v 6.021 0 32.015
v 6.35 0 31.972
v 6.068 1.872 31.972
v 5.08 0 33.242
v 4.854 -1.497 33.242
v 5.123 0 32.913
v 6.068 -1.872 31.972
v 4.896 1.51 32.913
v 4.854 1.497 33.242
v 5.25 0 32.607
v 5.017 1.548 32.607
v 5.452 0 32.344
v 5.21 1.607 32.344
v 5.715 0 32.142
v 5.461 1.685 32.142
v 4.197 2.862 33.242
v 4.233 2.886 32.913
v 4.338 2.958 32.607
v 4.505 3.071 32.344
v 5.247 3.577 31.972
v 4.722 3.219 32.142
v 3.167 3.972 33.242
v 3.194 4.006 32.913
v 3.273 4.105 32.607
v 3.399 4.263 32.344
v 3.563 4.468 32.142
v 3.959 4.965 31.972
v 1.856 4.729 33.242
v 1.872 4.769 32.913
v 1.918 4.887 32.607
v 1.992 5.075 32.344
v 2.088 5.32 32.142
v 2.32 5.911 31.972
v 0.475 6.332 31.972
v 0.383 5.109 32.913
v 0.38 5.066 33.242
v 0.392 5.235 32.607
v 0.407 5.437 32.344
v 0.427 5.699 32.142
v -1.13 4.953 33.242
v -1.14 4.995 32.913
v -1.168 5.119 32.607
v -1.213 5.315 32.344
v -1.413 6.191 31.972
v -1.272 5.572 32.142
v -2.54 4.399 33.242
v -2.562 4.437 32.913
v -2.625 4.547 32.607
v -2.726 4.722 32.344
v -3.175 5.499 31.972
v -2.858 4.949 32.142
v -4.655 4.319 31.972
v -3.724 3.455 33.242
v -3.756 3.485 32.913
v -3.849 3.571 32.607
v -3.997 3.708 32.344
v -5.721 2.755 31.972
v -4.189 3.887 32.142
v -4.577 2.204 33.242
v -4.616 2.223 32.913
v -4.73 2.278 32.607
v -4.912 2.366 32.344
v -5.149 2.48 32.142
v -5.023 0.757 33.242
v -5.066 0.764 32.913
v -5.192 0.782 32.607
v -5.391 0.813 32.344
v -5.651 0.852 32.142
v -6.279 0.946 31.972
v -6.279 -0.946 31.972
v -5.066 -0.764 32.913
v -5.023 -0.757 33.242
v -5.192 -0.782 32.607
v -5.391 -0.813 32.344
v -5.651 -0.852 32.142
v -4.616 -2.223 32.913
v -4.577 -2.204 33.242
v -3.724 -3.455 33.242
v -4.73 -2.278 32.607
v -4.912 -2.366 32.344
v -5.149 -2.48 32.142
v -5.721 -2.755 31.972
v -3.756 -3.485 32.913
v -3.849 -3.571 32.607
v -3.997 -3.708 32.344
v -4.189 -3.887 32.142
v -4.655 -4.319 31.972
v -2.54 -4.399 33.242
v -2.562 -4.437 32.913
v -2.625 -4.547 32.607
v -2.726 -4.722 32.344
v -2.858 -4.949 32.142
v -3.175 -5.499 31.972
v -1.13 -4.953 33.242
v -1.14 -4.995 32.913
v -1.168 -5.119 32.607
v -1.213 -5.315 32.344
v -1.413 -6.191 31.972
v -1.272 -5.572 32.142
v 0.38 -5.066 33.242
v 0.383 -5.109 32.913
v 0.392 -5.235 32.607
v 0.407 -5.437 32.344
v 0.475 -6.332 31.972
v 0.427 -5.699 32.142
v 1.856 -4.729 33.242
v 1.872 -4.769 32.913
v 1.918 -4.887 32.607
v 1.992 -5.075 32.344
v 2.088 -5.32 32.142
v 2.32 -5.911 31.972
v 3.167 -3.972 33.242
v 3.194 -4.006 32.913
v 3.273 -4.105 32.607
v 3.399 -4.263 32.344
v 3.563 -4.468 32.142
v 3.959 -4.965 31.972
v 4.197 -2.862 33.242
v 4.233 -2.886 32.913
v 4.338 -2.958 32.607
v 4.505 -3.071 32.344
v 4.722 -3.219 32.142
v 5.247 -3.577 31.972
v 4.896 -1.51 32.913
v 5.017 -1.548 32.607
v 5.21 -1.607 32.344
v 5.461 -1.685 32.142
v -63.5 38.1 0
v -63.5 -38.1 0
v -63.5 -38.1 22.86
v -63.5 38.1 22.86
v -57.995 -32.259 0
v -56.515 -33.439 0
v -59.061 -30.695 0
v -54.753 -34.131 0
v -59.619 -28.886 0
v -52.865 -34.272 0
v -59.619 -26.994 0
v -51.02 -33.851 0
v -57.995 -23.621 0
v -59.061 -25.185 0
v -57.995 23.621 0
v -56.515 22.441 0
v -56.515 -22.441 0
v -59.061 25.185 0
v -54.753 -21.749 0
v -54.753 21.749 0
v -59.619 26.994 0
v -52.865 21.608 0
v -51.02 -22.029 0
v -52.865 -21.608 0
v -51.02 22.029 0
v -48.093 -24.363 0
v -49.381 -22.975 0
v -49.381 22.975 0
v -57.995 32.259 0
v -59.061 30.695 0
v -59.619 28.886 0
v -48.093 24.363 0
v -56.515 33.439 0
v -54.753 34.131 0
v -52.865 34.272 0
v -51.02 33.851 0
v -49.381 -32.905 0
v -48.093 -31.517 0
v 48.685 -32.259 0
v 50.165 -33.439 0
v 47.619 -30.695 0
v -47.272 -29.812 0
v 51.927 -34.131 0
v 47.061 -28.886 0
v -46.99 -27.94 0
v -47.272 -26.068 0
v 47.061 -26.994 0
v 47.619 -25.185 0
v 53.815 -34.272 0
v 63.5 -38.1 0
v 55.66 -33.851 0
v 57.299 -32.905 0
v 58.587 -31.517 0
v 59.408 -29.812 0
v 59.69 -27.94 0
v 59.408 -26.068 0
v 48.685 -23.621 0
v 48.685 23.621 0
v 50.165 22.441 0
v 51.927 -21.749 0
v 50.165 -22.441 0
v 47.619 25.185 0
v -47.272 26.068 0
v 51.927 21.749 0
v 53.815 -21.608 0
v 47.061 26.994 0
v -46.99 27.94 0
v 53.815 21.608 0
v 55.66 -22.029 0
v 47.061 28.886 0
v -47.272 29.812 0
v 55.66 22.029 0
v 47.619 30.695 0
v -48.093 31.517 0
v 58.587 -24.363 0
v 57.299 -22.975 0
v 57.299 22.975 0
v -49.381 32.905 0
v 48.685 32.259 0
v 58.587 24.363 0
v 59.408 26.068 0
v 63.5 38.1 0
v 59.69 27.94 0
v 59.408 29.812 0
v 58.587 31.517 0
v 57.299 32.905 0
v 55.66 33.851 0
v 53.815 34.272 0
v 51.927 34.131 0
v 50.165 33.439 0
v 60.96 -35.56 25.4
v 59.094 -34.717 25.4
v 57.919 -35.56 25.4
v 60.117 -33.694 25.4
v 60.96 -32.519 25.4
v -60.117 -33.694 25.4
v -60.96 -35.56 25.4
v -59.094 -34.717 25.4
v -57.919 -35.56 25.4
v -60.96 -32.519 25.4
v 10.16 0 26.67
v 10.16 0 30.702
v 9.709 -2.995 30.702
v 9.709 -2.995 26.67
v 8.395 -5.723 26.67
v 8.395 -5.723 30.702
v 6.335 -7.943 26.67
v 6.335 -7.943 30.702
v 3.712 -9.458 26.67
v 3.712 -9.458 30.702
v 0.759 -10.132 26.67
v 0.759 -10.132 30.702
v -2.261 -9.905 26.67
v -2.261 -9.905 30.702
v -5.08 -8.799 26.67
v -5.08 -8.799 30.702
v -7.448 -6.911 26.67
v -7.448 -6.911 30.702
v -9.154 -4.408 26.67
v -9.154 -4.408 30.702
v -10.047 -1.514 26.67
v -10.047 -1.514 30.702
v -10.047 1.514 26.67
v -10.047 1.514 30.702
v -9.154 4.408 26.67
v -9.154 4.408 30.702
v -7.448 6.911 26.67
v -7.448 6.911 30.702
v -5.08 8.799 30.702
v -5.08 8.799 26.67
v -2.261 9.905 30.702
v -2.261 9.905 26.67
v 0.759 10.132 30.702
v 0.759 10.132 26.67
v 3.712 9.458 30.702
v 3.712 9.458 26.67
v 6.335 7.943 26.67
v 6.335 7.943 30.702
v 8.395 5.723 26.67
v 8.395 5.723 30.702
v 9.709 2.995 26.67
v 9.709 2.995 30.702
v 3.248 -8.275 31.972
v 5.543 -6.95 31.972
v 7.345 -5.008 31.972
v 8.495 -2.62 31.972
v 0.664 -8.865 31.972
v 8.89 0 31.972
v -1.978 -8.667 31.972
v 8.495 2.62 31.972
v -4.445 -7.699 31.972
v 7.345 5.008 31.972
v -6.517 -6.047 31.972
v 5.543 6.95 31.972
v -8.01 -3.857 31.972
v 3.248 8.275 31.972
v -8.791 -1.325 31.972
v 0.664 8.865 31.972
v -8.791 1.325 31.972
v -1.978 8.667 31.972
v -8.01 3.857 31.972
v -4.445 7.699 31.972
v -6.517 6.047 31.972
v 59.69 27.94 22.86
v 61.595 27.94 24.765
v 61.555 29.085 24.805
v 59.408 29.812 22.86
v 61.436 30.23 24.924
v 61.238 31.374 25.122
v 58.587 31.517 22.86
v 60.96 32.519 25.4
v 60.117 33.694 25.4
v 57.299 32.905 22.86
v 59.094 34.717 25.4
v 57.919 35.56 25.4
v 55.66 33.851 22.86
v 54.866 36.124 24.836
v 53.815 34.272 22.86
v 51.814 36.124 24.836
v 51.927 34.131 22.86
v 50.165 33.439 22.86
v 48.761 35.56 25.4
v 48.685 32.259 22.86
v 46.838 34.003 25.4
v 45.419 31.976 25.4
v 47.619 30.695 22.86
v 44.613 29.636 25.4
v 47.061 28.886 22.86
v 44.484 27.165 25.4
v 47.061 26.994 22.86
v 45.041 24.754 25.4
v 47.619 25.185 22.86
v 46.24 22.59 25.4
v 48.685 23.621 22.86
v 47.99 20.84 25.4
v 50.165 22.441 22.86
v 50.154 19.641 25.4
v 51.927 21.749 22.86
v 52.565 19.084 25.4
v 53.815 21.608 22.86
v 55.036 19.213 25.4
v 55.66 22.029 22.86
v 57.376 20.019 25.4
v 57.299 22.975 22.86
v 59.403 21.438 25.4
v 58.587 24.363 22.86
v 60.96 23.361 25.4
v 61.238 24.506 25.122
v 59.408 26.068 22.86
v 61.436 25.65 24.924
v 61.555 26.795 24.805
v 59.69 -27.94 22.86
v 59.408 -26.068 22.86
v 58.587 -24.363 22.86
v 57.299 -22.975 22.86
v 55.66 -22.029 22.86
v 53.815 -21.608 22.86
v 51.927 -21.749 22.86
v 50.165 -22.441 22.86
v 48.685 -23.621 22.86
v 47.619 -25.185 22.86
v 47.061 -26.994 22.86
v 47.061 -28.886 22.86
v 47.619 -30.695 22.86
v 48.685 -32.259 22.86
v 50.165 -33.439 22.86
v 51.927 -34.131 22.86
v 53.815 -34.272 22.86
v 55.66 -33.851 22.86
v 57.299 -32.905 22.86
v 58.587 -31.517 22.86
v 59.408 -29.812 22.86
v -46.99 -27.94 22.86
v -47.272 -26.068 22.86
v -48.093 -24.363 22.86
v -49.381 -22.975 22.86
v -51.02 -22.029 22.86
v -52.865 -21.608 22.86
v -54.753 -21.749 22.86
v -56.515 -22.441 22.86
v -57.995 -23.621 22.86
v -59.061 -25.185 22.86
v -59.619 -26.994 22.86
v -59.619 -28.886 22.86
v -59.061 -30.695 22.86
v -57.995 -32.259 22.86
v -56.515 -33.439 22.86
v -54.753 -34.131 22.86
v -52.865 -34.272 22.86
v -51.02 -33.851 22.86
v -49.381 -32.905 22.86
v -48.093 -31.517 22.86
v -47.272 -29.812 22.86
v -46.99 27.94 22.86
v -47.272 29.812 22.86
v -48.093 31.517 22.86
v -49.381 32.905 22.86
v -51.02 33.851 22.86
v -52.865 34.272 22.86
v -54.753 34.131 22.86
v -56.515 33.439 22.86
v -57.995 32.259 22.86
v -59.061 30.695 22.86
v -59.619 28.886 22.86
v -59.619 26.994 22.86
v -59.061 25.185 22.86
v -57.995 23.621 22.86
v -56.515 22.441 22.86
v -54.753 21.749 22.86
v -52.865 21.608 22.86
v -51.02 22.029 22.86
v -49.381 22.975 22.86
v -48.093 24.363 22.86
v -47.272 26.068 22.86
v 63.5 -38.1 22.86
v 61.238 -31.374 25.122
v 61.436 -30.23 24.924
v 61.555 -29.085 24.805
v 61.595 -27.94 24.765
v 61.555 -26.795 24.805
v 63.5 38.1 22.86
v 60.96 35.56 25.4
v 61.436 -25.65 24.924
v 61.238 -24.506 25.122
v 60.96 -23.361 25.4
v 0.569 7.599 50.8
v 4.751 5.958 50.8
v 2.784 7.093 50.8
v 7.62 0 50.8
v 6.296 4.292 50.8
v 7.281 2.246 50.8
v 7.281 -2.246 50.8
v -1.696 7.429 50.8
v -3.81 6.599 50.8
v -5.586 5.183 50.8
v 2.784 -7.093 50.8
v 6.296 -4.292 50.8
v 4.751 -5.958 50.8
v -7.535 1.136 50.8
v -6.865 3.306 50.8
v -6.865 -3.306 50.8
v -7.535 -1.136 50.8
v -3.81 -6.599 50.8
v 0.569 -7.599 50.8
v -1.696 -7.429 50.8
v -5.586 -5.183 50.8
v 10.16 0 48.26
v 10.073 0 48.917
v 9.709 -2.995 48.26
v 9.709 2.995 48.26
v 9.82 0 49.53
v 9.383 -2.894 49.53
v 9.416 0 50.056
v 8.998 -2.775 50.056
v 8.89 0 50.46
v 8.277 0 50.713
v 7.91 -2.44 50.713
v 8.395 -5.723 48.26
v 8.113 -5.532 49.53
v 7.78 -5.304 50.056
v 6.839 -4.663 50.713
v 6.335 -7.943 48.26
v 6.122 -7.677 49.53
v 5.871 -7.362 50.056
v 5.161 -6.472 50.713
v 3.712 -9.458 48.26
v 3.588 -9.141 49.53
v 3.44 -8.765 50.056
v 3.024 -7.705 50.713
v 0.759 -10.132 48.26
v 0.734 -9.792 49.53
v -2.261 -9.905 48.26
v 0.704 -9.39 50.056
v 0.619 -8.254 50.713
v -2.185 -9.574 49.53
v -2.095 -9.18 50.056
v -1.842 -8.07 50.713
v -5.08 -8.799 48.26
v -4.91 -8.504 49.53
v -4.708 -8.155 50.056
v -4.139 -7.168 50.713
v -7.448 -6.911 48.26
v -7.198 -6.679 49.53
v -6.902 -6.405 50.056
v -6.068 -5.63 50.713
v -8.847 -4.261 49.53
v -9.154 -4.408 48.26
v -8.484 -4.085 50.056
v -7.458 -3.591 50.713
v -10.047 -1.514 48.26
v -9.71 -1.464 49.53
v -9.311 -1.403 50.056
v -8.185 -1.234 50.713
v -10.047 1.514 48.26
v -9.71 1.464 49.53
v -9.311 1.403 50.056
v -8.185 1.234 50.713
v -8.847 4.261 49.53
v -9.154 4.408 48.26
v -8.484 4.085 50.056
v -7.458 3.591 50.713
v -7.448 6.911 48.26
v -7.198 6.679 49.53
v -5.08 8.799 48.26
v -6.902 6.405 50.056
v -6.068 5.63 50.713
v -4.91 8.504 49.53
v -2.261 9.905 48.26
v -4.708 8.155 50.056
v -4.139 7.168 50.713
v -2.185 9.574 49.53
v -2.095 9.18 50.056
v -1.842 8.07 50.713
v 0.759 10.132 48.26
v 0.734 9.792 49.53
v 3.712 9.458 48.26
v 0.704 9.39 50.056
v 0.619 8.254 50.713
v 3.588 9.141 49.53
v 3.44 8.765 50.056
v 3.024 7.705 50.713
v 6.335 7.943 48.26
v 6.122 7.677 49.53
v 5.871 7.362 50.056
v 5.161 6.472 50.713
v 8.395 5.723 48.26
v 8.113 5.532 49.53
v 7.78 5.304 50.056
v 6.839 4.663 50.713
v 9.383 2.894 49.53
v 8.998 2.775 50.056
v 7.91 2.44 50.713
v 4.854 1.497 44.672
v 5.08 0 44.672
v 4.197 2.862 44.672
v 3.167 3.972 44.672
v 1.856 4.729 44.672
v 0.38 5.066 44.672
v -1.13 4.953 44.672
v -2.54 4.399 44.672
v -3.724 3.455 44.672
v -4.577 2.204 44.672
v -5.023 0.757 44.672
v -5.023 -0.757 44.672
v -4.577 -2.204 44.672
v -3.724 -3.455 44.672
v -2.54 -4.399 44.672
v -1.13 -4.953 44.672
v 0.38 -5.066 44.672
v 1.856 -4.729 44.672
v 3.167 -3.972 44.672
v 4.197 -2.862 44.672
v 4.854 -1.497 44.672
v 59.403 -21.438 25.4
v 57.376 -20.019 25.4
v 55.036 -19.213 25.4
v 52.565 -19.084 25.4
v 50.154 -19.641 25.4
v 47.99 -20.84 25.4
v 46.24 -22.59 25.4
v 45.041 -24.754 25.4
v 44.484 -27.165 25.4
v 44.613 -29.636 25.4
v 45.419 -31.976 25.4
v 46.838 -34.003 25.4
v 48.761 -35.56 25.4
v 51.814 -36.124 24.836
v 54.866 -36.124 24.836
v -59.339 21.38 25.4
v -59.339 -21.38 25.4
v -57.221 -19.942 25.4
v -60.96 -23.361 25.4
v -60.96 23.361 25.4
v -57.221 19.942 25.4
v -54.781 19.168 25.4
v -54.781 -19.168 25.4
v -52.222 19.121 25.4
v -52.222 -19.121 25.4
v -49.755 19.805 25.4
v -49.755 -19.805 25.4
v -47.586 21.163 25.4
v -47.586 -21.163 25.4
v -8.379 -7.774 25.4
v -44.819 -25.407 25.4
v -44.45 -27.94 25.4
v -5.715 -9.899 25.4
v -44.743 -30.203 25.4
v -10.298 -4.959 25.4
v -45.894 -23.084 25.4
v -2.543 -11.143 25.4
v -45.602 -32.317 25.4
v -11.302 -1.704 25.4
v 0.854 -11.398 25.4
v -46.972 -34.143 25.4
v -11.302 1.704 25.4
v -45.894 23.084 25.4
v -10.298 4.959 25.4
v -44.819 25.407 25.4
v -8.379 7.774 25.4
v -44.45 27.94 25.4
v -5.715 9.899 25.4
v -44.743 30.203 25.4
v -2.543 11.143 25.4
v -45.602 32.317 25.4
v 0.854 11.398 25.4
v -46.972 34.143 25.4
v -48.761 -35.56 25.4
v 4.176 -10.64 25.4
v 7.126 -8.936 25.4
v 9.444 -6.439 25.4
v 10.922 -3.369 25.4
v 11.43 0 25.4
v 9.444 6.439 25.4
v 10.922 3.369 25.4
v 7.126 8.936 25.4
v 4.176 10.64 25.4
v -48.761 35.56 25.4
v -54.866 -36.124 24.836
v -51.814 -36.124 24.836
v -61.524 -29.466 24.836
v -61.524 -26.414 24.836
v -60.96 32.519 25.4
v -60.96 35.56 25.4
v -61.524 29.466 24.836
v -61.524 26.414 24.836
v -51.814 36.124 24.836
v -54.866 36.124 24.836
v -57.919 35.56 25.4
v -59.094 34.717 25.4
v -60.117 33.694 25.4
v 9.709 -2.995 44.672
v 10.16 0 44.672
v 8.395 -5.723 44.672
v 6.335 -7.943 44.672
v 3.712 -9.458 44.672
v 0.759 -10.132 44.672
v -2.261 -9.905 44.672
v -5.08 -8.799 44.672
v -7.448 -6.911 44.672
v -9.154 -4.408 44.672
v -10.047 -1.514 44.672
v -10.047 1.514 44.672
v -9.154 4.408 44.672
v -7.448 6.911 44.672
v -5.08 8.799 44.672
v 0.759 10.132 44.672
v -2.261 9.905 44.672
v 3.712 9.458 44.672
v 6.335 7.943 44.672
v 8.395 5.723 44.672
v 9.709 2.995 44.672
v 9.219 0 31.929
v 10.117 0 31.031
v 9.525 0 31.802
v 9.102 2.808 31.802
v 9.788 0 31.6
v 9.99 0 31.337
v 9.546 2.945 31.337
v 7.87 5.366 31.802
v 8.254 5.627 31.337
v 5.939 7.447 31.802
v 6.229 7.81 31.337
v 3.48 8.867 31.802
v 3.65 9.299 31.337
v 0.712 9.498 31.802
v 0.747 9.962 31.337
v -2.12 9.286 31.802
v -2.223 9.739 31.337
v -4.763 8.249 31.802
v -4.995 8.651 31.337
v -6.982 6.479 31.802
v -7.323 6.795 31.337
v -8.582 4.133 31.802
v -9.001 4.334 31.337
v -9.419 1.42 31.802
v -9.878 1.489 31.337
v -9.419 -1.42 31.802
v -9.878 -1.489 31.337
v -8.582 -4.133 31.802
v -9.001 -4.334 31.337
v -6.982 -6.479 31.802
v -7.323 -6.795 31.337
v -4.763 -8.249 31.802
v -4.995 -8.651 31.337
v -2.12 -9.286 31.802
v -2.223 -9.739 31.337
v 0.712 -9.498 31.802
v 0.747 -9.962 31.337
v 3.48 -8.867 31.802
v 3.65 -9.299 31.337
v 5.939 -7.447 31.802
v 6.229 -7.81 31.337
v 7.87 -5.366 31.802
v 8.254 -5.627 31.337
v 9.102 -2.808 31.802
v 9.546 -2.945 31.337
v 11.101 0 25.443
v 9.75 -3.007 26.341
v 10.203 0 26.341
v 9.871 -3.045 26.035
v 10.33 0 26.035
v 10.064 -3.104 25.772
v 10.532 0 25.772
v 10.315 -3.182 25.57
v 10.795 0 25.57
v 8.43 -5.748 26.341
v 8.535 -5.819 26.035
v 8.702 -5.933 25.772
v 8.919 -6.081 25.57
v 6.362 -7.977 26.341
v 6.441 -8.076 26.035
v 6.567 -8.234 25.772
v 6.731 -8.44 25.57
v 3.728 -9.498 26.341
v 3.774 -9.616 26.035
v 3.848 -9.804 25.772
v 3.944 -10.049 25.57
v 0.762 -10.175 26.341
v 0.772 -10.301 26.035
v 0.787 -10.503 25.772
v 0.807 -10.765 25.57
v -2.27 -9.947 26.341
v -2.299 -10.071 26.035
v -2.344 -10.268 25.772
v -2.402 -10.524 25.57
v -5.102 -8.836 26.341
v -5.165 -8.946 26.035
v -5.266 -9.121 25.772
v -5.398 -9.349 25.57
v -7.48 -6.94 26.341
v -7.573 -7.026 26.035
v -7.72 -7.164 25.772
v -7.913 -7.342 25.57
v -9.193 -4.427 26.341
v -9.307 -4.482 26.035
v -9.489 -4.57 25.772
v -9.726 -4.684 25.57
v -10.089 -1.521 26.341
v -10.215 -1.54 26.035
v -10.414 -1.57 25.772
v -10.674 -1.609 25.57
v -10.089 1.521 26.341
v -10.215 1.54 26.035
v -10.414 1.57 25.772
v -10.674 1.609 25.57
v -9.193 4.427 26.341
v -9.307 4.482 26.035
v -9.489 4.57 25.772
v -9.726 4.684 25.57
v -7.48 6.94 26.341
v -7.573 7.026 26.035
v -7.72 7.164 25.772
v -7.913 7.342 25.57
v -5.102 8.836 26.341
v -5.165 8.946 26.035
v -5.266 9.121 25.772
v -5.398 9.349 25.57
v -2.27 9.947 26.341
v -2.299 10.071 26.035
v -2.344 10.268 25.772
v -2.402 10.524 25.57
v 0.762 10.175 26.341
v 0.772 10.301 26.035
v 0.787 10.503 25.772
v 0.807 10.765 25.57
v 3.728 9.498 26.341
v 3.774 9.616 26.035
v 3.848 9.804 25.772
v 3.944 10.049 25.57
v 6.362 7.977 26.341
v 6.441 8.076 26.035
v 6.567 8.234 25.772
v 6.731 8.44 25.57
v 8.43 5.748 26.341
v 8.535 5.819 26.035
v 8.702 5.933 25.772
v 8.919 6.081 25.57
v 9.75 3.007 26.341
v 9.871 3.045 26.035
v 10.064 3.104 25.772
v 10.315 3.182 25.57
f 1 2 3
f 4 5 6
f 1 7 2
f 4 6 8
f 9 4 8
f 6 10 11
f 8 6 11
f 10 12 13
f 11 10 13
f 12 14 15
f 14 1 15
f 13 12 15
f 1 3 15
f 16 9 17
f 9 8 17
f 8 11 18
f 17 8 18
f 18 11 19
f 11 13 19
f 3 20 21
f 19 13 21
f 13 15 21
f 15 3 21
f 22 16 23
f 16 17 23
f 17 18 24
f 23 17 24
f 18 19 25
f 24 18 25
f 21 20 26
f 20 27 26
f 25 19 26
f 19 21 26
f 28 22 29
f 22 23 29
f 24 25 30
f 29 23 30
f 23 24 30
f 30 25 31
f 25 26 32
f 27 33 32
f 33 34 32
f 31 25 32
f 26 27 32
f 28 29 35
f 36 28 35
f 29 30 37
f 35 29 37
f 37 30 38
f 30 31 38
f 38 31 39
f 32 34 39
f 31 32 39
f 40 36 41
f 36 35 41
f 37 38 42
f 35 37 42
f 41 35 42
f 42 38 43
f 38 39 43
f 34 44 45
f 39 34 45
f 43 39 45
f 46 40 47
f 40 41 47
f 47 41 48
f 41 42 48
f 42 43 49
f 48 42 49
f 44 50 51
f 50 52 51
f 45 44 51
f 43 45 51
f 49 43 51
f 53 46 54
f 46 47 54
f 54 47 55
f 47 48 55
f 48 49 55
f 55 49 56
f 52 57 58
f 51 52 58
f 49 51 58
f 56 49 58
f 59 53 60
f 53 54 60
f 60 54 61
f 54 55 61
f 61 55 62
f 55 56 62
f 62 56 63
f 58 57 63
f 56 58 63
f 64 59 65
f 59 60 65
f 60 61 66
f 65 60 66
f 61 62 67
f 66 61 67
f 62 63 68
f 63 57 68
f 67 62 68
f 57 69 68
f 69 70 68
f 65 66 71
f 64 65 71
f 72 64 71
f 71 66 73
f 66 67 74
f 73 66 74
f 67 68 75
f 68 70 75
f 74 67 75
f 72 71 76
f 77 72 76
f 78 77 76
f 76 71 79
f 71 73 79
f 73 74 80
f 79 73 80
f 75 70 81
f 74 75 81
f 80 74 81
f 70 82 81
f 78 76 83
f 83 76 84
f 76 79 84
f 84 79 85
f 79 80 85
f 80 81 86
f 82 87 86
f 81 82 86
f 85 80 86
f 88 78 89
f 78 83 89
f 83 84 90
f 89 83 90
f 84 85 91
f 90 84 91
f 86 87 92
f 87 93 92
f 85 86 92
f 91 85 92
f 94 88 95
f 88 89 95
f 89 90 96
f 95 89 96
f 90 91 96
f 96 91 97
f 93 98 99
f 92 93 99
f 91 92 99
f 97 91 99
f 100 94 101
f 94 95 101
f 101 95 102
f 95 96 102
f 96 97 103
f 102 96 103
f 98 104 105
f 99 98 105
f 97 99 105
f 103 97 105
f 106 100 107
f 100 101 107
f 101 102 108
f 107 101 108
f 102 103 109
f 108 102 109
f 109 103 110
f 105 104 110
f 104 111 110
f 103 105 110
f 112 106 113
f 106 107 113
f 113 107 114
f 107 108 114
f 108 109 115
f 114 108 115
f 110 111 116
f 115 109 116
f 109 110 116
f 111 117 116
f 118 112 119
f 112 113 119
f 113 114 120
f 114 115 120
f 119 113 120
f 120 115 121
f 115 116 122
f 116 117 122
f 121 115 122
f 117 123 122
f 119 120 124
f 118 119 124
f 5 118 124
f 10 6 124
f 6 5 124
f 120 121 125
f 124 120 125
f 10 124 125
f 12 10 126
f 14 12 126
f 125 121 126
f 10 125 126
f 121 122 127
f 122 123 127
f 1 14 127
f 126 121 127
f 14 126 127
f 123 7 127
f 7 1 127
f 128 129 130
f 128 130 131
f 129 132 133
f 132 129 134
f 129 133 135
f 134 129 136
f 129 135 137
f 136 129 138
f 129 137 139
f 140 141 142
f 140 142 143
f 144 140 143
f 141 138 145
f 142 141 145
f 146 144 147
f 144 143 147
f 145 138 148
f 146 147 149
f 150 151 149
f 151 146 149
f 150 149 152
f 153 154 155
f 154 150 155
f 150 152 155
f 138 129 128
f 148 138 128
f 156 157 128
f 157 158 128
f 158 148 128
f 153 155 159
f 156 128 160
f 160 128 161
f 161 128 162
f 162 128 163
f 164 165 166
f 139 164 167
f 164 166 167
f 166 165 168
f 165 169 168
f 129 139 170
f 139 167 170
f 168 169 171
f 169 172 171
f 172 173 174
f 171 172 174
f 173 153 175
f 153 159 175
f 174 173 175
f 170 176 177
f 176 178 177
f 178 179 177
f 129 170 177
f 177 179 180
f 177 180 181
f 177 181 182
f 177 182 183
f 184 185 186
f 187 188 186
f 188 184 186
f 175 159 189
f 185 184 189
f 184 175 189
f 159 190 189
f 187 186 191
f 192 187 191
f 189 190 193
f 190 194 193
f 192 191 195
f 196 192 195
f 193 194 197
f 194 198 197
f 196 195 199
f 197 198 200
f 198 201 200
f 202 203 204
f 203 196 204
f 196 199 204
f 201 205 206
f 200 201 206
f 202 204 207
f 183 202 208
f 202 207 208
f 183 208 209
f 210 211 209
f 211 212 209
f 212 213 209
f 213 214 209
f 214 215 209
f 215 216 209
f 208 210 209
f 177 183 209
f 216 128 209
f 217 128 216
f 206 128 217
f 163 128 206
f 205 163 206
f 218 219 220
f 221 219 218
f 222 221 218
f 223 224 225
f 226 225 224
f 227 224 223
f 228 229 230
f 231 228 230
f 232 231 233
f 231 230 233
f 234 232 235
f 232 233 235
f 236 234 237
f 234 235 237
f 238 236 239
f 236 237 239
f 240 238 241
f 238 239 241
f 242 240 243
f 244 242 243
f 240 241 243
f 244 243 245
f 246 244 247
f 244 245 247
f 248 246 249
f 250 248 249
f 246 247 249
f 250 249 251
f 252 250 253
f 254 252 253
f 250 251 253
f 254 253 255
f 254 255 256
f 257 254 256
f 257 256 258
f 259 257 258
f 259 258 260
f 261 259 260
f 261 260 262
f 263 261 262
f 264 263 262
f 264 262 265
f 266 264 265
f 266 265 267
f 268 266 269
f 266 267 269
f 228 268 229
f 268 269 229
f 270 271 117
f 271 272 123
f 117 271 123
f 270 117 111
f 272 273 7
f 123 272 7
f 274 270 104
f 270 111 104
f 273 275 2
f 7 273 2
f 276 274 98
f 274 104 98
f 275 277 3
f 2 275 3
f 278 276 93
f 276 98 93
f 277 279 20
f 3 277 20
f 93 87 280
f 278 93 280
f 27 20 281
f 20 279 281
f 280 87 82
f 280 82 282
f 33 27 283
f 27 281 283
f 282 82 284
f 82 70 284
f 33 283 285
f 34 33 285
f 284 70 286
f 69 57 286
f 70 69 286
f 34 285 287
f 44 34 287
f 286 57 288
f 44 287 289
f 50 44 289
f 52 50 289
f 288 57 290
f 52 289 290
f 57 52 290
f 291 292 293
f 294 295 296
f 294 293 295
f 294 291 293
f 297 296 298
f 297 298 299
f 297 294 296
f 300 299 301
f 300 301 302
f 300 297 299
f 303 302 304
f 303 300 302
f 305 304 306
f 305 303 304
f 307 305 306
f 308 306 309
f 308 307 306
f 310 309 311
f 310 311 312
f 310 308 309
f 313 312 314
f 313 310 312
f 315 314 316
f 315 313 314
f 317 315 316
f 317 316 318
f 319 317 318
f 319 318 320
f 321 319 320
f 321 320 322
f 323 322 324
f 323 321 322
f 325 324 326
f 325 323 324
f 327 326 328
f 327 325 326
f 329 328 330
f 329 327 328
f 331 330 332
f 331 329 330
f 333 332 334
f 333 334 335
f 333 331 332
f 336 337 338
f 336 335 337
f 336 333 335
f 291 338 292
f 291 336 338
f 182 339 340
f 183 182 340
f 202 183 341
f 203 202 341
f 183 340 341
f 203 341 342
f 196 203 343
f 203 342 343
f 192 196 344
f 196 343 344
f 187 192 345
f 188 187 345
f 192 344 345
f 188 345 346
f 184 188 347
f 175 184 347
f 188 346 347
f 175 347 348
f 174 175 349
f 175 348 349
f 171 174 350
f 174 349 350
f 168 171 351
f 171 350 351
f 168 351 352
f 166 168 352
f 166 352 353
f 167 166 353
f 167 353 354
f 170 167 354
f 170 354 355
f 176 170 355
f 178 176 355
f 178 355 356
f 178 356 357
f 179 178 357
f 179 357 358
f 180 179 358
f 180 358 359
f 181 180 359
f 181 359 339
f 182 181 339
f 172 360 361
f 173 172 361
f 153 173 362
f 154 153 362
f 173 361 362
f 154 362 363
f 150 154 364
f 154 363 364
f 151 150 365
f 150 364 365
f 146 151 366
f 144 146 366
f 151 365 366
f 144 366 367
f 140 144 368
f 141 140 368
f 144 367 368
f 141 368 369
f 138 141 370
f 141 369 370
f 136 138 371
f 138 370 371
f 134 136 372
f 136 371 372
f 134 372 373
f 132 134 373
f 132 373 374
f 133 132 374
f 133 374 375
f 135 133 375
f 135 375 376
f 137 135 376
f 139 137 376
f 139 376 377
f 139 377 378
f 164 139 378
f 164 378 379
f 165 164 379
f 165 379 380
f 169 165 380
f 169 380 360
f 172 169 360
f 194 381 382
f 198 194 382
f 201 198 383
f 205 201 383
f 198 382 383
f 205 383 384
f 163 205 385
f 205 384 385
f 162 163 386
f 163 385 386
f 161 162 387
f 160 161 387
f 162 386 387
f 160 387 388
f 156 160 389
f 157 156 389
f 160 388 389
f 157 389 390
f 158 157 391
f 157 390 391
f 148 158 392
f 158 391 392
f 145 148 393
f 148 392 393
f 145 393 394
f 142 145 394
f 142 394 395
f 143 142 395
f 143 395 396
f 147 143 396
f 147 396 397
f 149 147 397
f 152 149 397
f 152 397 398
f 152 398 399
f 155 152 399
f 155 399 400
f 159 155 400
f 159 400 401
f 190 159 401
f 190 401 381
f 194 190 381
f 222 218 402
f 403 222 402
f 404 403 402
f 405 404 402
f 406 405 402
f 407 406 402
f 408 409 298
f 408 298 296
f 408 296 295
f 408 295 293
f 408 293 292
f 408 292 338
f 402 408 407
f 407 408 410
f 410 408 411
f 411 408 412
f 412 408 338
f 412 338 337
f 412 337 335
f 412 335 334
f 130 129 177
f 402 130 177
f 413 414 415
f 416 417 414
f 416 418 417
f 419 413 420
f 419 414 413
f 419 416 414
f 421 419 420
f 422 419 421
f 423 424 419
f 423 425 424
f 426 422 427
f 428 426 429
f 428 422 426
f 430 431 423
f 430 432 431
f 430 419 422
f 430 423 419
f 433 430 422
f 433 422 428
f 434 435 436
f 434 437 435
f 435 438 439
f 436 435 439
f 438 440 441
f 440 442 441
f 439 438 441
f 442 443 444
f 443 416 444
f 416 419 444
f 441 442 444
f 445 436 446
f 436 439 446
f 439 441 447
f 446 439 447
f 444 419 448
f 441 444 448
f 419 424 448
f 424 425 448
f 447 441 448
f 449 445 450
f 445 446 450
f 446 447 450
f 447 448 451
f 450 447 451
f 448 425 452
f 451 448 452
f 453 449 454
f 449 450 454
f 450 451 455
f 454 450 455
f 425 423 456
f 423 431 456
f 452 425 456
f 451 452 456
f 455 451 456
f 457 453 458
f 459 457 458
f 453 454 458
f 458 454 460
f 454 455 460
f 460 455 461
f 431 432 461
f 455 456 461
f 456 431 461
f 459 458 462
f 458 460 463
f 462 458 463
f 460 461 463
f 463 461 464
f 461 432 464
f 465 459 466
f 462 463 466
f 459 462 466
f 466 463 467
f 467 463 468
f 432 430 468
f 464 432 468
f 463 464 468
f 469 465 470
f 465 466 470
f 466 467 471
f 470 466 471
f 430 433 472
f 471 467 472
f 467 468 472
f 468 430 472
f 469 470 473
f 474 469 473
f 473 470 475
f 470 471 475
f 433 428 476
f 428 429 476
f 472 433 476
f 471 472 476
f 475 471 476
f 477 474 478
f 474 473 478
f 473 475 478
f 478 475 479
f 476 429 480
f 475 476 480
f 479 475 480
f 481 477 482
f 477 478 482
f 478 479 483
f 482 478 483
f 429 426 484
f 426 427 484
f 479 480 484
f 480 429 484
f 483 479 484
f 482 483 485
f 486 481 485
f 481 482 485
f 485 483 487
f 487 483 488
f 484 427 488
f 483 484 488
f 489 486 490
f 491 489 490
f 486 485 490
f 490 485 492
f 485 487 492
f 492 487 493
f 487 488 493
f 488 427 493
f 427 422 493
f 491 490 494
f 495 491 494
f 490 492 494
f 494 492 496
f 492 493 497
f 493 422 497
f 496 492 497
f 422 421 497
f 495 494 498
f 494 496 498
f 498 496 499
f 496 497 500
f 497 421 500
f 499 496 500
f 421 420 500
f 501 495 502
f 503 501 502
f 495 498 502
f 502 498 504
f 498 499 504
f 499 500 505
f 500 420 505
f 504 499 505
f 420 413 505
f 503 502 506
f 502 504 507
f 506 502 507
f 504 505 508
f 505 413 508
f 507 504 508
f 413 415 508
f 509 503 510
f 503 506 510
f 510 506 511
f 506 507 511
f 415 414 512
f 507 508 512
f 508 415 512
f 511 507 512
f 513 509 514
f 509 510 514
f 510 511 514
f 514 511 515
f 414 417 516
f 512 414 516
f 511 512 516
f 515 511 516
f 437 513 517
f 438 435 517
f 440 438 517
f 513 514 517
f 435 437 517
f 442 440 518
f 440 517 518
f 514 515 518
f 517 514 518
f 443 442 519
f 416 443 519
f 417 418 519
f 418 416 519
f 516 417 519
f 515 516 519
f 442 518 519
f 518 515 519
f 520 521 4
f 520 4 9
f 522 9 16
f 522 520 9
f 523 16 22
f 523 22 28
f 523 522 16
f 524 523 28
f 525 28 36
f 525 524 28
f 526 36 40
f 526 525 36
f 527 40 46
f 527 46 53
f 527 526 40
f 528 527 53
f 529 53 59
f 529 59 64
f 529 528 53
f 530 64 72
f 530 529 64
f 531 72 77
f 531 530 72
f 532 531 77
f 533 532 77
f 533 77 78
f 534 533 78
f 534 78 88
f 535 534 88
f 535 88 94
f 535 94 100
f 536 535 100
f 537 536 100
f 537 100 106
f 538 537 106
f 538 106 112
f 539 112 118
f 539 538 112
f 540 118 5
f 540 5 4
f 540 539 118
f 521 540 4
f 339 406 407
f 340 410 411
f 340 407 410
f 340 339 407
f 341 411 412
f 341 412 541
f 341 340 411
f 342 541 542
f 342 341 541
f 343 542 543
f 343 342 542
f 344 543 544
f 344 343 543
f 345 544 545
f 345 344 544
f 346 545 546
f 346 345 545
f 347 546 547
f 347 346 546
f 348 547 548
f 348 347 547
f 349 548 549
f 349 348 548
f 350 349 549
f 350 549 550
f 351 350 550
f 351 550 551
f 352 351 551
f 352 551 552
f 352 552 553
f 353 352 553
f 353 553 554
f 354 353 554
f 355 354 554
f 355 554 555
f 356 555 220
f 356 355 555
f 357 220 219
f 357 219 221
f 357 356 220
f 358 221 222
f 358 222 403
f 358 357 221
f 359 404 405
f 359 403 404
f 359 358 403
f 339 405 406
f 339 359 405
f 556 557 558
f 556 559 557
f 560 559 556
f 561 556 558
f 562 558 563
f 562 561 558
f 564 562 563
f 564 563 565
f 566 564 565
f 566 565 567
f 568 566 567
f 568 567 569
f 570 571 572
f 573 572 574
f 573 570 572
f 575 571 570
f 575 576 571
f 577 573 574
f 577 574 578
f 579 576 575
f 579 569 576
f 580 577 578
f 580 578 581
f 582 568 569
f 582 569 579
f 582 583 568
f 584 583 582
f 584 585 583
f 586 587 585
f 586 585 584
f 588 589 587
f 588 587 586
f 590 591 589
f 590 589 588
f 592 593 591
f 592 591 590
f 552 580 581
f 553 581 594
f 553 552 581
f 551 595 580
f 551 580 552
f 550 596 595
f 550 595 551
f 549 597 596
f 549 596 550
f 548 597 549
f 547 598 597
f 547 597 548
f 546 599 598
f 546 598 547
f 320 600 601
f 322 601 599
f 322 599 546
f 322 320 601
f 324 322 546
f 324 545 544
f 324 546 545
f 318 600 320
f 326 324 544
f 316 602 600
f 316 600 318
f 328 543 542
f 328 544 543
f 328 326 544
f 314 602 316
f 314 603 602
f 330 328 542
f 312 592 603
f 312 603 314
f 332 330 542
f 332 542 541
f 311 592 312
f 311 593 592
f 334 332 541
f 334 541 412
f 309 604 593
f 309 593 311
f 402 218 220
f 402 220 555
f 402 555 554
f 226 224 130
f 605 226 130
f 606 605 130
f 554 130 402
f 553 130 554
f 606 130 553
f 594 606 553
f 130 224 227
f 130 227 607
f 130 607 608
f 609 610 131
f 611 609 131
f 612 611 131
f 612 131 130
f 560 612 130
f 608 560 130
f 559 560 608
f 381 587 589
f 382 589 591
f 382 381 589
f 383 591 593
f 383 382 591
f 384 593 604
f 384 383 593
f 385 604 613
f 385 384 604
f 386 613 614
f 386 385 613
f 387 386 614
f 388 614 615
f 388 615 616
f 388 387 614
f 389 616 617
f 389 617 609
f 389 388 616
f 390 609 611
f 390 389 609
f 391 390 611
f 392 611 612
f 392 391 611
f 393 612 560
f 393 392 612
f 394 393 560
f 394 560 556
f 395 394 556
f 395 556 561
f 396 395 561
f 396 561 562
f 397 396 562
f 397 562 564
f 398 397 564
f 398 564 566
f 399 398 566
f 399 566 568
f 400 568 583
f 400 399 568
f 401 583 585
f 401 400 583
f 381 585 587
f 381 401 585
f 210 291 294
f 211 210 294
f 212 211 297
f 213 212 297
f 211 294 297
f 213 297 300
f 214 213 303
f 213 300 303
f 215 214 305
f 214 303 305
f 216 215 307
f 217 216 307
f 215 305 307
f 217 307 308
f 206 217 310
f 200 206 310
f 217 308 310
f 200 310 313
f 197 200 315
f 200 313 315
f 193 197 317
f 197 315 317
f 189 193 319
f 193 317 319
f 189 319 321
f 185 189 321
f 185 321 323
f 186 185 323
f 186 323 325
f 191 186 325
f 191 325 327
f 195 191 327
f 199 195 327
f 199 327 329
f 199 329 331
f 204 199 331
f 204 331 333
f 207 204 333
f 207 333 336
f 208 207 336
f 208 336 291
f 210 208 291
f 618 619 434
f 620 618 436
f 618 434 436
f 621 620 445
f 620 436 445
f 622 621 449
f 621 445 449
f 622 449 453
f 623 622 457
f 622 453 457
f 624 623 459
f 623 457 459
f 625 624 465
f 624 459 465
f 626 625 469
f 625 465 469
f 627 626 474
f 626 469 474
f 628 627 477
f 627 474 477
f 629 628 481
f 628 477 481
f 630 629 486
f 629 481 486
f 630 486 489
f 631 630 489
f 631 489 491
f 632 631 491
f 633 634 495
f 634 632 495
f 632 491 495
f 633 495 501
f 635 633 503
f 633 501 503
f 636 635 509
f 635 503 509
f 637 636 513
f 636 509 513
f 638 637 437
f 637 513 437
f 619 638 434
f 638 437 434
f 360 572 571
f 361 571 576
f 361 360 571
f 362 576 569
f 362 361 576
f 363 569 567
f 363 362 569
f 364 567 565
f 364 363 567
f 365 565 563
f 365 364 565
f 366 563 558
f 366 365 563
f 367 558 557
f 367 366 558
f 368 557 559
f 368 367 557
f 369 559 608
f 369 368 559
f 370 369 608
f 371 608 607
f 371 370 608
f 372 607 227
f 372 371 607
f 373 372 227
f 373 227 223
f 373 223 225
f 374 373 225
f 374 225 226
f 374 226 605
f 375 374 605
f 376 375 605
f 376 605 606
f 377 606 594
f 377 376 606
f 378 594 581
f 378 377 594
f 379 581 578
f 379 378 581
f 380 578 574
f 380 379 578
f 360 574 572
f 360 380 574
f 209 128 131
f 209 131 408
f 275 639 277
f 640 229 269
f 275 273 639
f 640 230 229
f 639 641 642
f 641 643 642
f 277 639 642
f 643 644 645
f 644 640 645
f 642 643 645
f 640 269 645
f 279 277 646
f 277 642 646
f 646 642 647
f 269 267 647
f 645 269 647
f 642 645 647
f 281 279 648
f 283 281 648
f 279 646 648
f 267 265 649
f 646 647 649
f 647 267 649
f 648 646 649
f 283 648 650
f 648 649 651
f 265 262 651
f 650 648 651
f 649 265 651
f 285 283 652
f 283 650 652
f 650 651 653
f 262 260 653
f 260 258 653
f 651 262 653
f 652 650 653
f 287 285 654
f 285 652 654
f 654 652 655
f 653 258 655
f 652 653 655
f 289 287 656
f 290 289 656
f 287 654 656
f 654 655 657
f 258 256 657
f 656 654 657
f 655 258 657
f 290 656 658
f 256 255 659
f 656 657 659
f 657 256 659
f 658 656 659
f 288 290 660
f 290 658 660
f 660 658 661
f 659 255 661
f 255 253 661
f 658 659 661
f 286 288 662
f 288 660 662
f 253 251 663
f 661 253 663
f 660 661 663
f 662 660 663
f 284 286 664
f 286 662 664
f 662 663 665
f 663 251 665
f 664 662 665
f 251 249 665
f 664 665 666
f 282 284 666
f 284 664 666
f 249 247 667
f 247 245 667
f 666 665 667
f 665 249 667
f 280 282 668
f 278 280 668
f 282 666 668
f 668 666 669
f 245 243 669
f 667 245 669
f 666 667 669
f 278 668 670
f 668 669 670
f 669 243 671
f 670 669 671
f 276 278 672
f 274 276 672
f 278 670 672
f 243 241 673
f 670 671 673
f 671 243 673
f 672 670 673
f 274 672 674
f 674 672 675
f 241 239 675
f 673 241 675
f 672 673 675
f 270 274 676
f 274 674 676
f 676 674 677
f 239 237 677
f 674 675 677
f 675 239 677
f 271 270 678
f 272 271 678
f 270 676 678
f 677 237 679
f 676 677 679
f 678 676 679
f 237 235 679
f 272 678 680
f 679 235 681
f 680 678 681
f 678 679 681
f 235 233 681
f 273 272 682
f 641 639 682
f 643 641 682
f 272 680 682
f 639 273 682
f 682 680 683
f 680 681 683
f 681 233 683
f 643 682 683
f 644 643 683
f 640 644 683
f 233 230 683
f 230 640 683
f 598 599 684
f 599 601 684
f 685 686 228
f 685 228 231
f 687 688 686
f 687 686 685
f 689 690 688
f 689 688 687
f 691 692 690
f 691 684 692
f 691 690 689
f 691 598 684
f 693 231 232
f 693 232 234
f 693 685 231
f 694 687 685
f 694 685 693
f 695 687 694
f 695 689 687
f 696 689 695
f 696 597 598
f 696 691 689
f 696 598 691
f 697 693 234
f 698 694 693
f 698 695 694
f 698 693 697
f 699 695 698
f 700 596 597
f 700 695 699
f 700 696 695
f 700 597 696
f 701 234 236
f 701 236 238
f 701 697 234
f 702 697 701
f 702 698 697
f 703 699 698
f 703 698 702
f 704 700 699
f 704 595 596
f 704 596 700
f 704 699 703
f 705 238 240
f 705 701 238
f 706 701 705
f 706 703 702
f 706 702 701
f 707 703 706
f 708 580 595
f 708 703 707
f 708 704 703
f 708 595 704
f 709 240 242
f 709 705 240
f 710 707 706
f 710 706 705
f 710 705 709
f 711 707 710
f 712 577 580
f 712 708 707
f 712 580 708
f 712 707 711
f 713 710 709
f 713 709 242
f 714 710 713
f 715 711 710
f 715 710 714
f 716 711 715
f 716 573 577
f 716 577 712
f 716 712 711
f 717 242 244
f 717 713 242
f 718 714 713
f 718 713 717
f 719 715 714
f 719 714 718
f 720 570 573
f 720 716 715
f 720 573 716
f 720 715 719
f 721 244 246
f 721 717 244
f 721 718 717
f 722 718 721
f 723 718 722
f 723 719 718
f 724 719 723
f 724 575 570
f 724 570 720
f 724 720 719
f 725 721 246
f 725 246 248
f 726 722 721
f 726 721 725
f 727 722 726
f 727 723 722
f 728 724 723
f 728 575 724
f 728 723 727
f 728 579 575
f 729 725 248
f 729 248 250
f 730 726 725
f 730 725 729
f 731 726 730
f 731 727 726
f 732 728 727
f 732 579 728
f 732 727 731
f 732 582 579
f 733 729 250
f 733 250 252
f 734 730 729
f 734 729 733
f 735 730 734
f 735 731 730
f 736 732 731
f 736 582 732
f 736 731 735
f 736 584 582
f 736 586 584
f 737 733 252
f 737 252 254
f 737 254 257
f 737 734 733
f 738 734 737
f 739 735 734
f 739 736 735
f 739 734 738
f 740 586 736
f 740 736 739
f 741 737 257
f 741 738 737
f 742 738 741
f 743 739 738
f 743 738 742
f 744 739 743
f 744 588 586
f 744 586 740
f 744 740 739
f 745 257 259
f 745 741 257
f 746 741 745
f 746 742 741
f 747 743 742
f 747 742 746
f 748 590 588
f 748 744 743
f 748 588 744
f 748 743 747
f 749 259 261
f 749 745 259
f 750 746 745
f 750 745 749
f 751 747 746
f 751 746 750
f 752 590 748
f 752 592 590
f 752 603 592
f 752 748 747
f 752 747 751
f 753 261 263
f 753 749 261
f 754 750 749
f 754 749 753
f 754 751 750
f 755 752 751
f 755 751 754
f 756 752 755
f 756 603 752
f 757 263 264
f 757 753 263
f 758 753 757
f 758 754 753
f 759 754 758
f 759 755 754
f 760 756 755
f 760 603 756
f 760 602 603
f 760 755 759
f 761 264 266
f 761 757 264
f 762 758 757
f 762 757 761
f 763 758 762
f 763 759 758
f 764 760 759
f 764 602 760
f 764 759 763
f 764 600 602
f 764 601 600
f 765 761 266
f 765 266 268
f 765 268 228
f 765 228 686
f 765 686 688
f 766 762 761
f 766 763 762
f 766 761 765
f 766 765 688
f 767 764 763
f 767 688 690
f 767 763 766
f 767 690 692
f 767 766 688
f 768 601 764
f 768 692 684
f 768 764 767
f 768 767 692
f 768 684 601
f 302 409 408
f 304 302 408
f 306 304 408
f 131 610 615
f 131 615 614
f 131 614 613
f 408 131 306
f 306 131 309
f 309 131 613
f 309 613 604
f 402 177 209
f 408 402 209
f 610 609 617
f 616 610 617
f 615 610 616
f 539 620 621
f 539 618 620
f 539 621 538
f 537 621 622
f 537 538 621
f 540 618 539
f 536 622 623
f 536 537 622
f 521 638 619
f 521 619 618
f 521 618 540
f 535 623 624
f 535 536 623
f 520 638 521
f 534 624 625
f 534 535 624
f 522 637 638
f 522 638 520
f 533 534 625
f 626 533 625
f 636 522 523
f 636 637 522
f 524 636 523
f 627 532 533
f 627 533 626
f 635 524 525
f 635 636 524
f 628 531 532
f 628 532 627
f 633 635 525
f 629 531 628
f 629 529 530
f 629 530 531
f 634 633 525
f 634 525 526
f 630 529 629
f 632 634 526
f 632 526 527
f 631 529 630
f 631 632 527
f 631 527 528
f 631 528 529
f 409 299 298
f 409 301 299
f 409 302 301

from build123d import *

# Parameters (mm, degrees)
F0_W         = 127
F0_H         = 76.2
F1_DEPTH     = 25.4
F2_R         = 6.35
F3_DEPTH     = 25.401
F4_W         = 10.16
F4_H         = 25.4
F6_W         = 15.24
F6_H         = 12.7
F8_R         = 2.54
F9_R         = 1.27
F10_T1_DEPTH = 140.0641495789
F10_T3_DEPTH = 89.2641495789


# Not quite as in the source:
# - a fillet or chamfer that OpenCascade refuses, or shapes differently, is made with other operations: its cross-section is extruded or revolved along the edge and cut away or added


with BuildPart() as f1:
    # F0 (on Top) → F1 (new body)
    with BuildSketch(Plane.XY):
        Rectangle(F0_W, F0_H)
    extrude(amount=F1_DEPTH)

    # F2 (on face) → F3 (cut, through all)
    with BuildSketch(Plane.XY.offset(25.4)):
        with Locations((53.34, 27.94)):
            Circle(F2_R)
        with Locations((53.34, -27.94)):
            Circle(F2_R)
        with Locations((-53.34, 27.94)):
            Circle(F2_R)
        with Locations((-53.34, -27.94)):
            Circle(F2_R)
    extrude(amount=-F3_DEPTH, mode=Mode.SUBTRACT)

    # F4 (on Front) → F5 (revolve)
    with BuildSketch(Plane.XZ):
        with Locations((5.08, 38.1)):
            Rectangle(F4_W, F4_H)
    revolve(axis=Axis((0, 0, 38.1), (0, 0, -1)))

    # F6 (on Front) → F7 (revolve, cut)
    with BuildSketch(Plane.XZ):
        with Locations((12.7, 38.3218890125)):
            Rectangle(F6_W, F6_H)
    revolve(axis=Axis((0, 0, 25.4), (0, 0, 1)), mode=Mode.SUBTRACT)

    # F8
    f8_edges = [f1.edges().sort_by_distance(p)[0] for p in [
        (-10.16, 0, 50.8),
    ]]
    fillet(f8_edges, radius=F8_R)

    # F9
    f9_edges = [f1.edges().sort_by_distance(p)[0] for p in [
        (-10.16, 0, 31.971889),
        (-5.08, 0, 31.971889),
        (-10.16, 0, 25.4),
    ]]
    fillet(f9_edges, radius=F9_R)

    # F10: chamfer of 2.54 on 9 edges, made by hand

    # F10_s2 → F10_t1 (cut)
    with BuildSketch(Plane.YZ.offset(-70.0320747894)):
        Polygon((35.56, 25.4), (38.1, 22.86), (38.1, 25.4), align=None)
        Polygon((-35.56, 25.4), (-38.1, 22.86), (-38.1, 25.4), align=None)
    extrude(amount=F10_T1_DEPTH, mode=Mode.SUBTRACT)

    # F10_s4 → F10_t3 (cut)
    with BuildSketch(Plane.XZ.offset(-44.6320747894)):
        Polygon((60.96, 25.4), (63.5, 22.86), (63.5, 25.4), align=None)
        Polygon((-60.96, 25.4), (-63.5, 22.86), (-63.5, 25.4), align=None)
    extrude(amount=F10_T3_DEPTH, mode=Mode.SUBTRACT)

    # F10_s5 → F10_t6 (revolve, cut)
    with BuildSketch(Plane.XZ.offset(27.94)):
        Polygon((-44.45, 25.4), (-46.99, 22.86), (-46.99, 25.4), align=None)
    revolve(axis=Axis((-53.34, -27.94, 25.4), (0, 0, 1)), mode=Mode.SUBTRACT)

    # F10_s7 → F10_t8 (revolve, cut)
    with BuildSketch(Plane.XZ.offset(27.94)):
        Polygon((62.23, 25.4), (59.69, 22.86), (59.69, 25.4), align=None)
    revolve(axis=Axis((53.34, -27.94, 25.4), (0, 0, 1)), mode=Mode.SUBTRACT)

    # F10_s9 → F10_t10 (revolve, cut)
    with BuildSketch(Plane.XZ.offset(-27.94)):
        Polygon((-44.45, 25.4), (-46.99, 22.86), (-46.99, 25.4), align=None)
    revolve(axis=Axis((-53.34, 27.94, 25.4), (0, 0, 1)), mode=Mode.SUBTRACT)

    # F10_s11 → F10_t12 (revolve, cut)
    with BuildSketch(Plane.XZ.offset(-27.94)):
        Polygon((62.23, 25.4), (59.69, 22.86), (59.69, 25.4), align=None)
    revolve(axis=Axis((53.34, 27.94, 25.4), (0, 0, 1)), mode=Mode.SUBTRACT)


solid = f1.part
